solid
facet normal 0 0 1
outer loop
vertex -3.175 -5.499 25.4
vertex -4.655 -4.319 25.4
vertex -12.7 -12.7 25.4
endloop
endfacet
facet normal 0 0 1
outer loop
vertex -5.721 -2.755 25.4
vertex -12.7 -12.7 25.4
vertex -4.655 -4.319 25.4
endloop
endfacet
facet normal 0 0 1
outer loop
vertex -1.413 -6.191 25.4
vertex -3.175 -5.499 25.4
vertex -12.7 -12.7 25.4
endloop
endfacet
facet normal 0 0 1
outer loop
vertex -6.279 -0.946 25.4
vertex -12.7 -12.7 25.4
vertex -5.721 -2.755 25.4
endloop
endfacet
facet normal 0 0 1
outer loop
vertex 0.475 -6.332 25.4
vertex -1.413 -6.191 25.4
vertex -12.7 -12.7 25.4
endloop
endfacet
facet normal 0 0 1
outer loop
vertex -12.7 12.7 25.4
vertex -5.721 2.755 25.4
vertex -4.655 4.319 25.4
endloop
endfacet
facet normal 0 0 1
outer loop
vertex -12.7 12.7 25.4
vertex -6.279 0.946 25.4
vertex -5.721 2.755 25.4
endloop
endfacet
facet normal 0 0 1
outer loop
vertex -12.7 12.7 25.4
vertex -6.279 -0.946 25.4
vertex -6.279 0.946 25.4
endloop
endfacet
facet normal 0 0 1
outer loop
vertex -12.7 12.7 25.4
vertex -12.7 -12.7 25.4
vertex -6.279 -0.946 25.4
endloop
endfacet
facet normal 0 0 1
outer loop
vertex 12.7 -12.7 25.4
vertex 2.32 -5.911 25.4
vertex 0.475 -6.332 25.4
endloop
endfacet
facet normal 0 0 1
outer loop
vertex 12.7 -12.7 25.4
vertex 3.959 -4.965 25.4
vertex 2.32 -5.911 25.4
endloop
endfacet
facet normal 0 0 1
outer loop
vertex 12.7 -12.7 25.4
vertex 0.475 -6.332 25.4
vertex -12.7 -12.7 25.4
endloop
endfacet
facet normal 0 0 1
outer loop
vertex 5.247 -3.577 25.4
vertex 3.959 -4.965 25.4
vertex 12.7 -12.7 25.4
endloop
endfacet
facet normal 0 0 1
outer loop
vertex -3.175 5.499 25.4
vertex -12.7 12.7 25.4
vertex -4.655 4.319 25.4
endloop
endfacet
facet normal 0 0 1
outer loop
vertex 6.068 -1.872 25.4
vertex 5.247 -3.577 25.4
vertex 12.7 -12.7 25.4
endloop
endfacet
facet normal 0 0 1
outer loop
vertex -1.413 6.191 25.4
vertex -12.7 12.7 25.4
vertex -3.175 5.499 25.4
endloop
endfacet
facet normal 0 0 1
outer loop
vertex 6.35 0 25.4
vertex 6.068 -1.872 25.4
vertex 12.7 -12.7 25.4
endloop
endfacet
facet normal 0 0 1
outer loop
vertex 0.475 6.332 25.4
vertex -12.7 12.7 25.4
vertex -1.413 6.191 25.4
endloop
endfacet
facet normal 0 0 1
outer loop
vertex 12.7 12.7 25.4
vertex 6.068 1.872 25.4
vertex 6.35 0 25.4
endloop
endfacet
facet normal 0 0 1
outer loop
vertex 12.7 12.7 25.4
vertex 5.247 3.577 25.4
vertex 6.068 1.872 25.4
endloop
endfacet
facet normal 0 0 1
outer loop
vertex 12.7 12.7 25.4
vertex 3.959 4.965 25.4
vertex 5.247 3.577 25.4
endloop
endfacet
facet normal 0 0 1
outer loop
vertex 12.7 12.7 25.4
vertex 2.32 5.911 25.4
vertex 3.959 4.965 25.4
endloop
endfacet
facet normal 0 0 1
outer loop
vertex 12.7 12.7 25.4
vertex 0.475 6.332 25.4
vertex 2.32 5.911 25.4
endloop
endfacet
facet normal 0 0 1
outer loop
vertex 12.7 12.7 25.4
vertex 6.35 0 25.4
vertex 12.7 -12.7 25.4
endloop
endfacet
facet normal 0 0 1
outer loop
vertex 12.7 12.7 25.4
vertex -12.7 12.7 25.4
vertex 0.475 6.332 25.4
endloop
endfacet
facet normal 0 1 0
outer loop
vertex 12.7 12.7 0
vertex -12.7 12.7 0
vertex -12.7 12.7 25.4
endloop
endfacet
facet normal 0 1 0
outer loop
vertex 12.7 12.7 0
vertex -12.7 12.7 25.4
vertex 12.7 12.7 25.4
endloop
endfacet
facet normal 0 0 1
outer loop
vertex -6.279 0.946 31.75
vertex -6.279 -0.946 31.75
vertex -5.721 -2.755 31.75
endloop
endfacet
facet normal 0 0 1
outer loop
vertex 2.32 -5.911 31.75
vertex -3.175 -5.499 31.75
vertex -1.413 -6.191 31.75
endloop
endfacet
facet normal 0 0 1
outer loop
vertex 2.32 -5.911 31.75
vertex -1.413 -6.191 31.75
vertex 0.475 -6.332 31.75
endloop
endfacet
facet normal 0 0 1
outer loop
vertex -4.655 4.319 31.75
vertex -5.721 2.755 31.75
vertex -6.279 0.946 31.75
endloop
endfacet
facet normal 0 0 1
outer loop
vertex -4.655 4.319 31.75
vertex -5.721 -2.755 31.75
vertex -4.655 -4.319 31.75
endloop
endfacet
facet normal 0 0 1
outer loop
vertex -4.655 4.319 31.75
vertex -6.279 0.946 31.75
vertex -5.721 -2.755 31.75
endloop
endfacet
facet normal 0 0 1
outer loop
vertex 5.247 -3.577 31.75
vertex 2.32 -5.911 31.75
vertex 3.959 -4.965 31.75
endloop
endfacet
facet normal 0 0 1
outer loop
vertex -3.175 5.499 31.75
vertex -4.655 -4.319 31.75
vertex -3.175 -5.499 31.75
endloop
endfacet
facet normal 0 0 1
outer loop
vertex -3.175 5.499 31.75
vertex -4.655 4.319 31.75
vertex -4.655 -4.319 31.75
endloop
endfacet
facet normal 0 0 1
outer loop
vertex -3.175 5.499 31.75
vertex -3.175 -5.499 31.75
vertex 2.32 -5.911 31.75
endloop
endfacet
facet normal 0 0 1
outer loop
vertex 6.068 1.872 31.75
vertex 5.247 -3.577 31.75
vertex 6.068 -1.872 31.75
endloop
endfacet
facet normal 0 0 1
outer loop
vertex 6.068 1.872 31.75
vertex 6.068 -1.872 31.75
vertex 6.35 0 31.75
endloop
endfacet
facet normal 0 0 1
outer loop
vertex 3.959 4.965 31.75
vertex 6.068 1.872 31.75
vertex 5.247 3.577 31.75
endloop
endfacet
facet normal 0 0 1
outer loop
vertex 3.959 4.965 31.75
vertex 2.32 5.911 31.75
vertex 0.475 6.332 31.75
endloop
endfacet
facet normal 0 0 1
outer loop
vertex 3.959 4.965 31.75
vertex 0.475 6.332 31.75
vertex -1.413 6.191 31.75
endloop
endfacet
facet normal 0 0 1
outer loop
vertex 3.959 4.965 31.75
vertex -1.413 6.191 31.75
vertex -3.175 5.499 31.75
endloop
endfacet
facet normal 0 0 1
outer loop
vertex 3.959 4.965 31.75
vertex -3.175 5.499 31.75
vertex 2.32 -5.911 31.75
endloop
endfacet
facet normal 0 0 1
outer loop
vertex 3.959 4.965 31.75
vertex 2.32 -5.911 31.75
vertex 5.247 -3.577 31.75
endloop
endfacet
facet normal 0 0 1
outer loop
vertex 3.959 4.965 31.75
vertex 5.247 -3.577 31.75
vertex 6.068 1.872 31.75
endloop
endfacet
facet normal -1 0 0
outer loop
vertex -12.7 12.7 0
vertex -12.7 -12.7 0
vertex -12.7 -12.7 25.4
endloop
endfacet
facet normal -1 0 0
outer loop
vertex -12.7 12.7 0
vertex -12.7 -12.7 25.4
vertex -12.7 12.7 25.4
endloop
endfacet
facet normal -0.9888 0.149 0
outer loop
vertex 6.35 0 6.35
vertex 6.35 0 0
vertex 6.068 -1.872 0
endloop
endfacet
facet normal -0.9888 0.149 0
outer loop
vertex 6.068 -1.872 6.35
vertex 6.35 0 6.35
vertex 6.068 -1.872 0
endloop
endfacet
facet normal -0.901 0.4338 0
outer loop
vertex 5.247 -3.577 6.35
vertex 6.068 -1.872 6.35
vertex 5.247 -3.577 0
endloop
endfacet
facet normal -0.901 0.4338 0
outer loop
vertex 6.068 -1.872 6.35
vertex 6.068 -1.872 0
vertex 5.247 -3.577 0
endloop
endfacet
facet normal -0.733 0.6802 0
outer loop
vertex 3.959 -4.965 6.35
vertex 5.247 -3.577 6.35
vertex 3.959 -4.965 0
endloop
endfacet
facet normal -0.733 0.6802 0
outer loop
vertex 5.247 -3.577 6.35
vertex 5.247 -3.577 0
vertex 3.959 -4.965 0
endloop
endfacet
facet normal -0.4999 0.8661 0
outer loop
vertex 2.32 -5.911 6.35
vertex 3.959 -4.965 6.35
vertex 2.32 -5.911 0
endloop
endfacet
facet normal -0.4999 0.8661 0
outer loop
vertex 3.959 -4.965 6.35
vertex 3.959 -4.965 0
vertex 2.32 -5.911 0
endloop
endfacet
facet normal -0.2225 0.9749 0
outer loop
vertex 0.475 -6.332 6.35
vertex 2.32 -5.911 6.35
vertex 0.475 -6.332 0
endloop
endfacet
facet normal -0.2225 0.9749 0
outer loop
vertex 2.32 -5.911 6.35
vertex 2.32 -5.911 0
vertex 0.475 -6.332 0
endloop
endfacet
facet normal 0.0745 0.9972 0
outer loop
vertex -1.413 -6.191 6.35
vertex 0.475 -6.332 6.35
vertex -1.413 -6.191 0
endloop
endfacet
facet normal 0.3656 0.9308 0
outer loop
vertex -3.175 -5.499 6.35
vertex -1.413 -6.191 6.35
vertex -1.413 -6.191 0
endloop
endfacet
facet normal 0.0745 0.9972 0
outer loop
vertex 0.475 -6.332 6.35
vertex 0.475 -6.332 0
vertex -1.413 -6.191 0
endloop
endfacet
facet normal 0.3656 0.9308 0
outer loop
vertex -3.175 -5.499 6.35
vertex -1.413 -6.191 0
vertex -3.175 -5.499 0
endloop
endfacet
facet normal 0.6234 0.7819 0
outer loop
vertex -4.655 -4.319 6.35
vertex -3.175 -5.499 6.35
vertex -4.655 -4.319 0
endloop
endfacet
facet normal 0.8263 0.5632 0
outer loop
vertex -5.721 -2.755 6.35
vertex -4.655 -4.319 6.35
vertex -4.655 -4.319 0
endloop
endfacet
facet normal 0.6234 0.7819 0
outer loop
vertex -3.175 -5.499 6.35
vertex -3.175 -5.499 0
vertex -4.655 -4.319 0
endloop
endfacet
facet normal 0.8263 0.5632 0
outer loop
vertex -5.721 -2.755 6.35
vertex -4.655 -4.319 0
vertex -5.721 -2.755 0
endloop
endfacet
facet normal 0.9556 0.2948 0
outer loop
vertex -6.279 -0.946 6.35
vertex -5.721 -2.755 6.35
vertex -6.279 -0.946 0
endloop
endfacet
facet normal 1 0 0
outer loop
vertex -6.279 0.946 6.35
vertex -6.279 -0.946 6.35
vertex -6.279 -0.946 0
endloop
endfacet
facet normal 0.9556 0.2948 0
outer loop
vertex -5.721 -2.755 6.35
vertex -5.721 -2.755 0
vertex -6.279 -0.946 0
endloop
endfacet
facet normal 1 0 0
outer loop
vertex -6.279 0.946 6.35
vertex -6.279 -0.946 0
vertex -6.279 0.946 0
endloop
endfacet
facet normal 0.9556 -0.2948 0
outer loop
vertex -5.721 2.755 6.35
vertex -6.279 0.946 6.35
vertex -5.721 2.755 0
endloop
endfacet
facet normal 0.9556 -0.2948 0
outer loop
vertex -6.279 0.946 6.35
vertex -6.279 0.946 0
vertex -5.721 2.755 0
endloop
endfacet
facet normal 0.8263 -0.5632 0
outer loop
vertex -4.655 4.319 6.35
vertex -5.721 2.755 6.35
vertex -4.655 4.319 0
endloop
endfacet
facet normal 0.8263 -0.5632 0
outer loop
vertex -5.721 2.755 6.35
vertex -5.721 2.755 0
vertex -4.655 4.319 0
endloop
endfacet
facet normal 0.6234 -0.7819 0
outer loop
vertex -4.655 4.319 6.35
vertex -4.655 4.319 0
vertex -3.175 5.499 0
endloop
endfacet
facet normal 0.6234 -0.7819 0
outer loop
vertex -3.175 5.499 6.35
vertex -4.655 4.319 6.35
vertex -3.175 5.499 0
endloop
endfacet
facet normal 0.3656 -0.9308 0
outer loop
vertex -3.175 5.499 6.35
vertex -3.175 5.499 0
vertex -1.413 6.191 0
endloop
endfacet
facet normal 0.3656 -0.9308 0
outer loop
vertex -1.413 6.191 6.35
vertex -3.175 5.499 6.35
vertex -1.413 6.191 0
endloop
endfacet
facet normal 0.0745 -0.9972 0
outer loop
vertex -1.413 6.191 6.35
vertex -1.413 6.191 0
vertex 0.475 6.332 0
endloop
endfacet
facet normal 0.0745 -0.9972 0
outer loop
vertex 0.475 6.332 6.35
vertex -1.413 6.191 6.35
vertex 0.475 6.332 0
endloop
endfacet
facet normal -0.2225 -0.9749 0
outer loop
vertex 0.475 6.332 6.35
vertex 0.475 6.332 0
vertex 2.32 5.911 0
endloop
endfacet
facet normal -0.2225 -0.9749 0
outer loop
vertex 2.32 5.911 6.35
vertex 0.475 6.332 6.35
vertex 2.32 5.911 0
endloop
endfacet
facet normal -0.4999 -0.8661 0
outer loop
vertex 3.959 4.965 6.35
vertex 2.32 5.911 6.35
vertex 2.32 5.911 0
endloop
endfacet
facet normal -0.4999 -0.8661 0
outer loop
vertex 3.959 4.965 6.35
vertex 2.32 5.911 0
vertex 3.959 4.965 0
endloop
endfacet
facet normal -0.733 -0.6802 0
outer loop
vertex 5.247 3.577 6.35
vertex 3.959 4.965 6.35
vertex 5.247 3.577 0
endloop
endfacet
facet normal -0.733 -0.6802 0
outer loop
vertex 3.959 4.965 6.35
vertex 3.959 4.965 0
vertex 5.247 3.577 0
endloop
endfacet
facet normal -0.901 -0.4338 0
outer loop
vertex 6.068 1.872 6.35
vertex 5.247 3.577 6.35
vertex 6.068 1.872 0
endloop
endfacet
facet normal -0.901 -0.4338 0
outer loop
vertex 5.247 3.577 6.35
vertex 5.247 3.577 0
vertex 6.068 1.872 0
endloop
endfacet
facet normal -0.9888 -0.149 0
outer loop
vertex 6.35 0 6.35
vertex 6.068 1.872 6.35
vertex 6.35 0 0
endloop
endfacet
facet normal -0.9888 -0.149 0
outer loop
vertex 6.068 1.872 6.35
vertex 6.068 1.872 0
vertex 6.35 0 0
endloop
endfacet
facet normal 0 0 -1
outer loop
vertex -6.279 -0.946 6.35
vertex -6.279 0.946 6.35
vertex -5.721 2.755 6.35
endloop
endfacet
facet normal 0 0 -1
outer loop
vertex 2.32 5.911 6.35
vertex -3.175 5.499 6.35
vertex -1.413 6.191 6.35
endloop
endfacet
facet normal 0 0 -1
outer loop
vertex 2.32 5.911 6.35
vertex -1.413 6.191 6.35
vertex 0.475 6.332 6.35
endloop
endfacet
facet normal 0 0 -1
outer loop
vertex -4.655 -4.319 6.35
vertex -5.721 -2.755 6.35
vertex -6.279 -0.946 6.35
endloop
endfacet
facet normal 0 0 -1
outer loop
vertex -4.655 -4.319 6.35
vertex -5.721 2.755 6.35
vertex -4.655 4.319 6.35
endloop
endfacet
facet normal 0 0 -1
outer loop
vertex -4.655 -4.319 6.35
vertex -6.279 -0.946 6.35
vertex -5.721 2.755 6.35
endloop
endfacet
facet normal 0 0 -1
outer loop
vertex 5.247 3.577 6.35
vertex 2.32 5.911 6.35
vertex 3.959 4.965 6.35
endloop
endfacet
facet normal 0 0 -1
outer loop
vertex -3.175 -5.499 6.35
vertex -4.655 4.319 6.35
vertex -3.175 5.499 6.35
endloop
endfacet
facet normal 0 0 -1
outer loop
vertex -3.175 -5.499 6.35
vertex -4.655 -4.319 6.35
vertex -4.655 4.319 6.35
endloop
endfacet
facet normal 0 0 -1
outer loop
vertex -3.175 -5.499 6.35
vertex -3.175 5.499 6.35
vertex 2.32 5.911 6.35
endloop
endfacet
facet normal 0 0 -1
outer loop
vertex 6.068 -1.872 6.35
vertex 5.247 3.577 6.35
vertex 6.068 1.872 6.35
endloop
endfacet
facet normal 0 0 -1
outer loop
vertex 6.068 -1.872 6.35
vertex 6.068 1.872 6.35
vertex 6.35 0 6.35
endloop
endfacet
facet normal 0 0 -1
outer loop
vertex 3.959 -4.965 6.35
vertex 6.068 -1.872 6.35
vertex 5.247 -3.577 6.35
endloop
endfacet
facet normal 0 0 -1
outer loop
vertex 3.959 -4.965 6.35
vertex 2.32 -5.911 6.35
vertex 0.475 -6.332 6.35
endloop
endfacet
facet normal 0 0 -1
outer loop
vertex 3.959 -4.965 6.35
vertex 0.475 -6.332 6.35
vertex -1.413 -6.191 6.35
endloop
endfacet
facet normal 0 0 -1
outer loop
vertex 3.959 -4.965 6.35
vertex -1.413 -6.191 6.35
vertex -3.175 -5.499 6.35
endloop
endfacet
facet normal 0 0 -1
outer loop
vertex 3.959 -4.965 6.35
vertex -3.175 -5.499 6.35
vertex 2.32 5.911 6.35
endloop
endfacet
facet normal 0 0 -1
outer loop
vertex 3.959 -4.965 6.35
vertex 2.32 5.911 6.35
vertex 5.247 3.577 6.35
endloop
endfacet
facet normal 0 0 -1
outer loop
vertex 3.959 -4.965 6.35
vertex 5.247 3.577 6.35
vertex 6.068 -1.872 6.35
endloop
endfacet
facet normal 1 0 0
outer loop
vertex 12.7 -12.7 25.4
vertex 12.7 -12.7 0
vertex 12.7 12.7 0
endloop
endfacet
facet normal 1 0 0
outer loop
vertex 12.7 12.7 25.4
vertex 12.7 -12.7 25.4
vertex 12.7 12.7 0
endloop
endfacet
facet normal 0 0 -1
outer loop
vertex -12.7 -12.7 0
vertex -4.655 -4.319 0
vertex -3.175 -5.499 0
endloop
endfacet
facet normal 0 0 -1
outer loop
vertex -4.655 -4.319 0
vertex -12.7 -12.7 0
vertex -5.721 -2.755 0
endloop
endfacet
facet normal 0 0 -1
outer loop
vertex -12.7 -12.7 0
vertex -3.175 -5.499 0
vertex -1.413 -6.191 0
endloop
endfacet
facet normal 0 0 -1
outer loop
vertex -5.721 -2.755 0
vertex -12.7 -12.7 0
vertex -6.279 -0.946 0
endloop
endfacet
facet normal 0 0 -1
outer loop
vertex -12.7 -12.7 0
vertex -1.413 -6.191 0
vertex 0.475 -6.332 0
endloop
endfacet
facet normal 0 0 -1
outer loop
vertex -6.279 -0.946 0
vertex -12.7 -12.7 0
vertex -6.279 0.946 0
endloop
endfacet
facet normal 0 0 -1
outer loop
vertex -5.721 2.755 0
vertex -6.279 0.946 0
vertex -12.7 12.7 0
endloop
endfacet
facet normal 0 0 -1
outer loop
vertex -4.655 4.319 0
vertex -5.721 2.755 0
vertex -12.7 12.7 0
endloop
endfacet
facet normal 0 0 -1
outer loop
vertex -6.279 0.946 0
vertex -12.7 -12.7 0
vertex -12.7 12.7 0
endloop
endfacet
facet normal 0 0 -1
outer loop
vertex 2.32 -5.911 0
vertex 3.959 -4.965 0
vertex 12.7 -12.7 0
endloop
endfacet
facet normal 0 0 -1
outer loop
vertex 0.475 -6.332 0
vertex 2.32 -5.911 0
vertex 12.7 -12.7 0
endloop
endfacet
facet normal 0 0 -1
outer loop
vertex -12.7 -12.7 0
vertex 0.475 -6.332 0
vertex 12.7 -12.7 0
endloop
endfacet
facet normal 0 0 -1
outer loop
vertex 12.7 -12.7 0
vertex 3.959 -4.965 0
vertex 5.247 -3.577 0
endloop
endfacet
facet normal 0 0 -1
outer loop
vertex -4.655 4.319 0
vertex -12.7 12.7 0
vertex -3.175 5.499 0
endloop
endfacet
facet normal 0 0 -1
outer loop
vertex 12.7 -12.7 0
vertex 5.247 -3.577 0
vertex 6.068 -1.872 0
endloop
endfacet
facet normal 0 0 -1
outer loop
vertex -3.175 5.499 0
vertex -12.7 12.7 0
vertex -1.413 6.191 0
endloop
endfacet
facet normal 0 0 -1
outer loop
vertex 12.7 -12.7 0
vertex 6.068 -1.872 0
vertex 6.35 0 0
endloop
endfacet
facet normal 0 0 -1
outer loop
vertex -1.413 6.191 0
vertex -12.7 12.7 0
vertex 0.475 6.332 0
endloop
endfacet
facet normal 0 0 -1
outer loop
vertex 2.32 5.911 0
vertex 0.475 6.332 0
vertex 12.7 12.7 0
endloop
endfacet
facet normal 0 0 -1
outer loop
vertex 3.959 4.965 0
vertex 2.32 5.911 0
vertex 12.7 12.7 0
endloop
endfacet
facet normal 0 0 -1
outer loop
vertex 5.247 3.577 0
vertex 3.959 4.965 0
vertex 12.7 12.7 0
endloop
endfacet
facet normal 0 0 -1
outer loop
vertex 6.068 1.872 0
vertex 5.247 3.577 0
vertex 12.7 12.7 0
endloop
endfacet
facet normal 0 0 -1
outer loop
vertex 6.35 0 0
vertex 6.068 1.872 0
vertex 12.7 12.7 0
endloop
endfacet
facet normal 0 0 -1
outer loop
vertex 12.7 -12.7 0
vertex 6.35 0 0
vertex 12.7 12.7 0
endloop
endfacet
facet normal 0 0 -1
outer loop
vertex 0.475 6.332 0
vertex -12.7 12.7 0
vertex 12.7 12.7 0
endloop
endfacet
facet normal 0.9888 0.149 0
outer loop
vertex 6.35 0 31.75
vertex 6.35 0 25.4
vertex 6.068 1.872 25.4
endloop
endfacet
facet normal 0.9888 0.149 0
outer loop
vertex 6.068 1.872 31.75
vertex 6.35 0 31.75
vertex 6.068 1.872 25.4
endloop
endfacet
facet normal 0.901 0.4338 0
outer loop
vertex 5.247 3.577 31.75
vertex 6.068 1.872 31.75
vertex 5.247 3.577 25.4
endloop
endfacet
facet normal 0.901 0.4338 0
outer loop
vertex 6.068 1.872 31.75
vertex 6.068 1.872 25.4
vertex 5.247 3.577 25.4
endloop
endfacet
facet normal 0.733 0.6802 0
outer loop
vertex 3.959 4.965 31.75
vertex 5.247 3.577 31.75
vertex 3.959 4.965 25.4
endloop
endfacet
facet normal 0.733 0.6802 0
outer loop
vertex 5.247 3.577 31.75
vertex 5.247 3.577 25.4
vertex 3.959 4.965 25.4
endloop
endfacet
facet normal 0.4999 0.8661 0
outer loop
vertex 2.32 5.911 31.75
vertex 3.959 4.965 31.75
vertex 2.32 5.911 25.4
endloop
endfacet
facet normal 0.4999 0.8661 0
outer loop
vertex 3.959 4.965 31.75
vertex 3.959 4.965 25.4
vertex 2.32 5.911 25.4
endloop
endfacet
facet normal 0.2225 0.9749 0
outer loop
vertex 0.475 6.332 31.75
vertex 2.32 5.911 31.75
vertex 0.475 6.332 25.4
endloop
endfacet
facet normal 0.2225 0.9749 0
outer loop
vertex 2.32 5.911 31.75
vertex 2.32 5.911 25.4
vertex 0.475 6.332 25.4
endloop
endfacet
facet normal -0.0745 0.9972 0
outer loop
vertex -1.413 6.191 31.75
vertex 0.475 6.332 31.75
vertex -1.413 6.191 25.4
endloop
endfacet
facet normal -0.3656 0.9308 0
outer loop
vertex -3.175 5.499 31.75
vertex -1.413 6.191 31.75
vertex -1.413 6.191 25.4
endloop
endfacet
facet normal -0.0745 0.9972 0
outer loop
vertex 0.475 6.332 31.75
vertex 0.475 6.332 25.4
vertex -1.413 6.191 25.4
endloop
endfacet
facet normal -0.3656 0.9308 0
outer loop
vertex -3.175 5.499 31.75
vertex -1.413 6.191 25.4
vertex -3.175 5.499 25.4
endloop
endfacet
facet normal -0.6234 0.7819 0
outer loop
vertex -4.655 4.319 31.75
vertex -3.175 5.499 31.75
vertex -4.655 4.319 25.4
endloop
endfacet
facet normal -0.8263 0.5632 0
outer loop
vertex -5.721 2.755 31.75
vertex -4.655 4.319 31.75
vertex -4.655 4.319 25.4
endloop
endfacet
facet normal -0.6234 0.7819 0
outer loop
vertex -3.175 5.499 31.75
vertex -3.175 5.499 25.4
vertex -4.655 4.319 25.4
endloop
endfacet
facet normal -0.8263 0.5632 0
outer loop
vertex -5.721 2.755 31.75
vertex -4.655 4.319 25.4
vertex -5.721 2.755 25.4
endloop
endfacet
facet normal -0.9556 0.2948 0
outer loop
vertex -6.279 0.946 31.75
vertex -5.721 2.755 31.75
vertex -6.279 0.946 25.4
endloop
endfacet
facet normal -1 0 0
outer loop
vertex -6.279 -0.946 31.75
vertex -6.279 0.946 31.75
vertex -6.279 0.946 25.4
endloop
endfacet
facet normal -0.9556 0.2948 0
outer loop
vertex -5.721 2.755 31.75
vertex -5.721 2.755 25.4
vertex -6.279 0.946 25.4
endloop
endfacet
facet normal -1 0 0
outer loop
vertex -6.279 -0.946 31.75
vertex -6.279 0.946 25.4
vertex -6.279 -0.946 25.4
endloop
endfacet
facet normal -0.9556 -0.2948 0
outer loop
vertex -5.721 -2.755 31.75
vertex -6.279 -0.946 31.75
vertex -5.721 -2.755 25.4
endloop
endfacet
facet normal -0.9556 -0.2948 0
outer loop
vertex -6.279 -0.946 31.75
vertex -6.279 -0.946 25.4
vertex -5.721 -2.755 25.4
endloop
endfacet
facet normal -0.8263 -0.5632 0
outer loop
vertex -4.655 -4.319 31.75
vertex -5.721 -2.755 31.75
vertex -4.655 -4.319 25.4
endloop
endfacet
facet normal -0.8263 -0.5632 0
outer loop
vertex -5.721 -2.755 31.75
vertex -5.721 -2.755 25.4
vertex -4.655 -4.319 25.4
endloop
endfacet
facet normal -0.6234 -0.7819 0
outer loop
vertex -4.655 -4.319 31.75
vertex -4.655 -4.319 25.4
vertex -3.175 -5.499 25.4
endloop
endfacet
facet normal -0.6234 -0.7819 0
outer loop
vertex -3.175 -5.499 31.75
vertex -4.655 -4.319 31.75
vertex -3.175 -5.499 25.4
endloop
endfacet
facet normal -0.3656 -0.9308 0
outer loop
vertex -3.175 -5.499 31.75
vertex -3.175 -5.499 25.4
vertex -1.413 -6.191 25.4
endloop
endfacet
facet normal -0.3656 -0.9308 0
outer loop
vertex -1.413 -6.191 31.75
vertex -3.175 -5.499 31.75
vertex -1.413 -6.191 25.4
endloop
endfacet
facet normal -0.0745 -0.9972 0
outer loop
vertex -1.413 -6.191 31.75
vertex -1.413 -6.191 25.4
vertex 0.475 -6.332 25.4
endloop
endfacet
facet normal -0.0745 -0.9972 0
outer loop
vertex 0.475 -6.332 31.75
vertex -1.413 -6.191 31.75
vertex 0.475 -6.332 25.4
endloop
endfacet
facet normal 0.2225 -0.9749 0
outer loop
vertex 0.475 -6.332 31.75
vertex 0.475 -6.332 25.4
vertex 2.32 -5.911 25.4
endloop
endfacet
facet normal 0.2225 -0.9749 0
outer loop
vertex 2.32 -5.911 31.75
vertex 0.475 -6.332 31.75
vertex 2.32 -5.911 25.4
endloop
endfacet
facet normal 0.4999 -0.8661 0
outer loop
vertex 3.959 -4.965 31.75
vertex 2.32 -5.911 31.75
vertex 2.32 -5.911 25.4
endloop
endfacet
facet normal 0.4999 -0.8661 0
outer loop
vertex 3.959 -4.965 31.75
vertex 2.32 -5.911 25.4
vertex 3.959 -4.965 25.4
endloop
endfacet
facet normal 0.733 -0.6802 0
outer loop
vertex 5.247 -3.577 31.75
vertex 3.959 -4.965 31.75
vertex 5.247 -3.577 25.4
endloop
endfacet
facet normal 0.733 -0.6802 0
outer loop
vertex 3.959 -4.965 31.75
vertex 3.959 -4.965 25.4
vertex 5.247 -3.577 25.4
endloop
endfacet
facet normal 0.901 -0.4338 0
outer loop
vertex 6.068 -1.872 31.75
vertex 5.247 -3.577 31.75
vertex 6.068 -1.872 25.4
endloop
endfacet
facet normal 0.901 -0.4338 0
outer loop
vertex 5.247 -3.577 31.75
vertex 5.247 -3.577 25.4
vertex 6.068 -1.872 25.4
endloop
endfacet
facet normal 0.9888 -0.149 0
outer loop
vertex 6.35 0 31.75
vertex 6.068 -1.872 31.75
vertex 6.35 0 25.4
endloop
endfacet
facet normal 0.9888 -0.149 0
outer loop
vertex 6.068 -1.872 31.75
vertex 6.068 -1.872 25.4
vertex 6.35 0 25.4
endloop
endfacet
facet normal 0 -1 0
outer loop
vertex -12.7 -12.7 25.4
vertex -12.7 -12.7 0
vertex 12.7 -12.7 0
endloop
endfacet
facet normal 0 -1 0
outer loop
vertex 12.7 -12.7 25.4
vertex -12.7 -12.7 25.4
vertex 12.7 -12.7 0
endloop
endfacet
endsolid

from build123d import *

# Parameters (mm, degrees)
F0_W     = 25.4
F0_H     = 25.4
F1_DEPTH = 25.4
F2_R     = 6.35
F3_DEPTH = 6.35
F4_R     = 6.35
F5_DEPTH = 6.35


with BuildPart() as f1:
    # F0 (on Top) → F1 (new body)
    with BuildSketch(Plane.XY):
        Rectangle(F0_W, F0_H)
    extrude(amount=F1_DEPTH)

    # F2 (on face) → F3 (cut)
    with BuildSketch(Plane(origin=(0, 0, 0), x_dir=(1, 0, 0), z_dir=(0, 0, -1))):
        Circle(F2_R)
    extrude(amount=-F3_DEPTH, mode=Mode.SUBTRACT)

    # F4 (on face) → F5 (join)
    with BuildSketch(Plane.XY.offset(25.4)):
        Circle(F4_R)
    extrude(amount=F5_DEPTH)


solid = f1.part
